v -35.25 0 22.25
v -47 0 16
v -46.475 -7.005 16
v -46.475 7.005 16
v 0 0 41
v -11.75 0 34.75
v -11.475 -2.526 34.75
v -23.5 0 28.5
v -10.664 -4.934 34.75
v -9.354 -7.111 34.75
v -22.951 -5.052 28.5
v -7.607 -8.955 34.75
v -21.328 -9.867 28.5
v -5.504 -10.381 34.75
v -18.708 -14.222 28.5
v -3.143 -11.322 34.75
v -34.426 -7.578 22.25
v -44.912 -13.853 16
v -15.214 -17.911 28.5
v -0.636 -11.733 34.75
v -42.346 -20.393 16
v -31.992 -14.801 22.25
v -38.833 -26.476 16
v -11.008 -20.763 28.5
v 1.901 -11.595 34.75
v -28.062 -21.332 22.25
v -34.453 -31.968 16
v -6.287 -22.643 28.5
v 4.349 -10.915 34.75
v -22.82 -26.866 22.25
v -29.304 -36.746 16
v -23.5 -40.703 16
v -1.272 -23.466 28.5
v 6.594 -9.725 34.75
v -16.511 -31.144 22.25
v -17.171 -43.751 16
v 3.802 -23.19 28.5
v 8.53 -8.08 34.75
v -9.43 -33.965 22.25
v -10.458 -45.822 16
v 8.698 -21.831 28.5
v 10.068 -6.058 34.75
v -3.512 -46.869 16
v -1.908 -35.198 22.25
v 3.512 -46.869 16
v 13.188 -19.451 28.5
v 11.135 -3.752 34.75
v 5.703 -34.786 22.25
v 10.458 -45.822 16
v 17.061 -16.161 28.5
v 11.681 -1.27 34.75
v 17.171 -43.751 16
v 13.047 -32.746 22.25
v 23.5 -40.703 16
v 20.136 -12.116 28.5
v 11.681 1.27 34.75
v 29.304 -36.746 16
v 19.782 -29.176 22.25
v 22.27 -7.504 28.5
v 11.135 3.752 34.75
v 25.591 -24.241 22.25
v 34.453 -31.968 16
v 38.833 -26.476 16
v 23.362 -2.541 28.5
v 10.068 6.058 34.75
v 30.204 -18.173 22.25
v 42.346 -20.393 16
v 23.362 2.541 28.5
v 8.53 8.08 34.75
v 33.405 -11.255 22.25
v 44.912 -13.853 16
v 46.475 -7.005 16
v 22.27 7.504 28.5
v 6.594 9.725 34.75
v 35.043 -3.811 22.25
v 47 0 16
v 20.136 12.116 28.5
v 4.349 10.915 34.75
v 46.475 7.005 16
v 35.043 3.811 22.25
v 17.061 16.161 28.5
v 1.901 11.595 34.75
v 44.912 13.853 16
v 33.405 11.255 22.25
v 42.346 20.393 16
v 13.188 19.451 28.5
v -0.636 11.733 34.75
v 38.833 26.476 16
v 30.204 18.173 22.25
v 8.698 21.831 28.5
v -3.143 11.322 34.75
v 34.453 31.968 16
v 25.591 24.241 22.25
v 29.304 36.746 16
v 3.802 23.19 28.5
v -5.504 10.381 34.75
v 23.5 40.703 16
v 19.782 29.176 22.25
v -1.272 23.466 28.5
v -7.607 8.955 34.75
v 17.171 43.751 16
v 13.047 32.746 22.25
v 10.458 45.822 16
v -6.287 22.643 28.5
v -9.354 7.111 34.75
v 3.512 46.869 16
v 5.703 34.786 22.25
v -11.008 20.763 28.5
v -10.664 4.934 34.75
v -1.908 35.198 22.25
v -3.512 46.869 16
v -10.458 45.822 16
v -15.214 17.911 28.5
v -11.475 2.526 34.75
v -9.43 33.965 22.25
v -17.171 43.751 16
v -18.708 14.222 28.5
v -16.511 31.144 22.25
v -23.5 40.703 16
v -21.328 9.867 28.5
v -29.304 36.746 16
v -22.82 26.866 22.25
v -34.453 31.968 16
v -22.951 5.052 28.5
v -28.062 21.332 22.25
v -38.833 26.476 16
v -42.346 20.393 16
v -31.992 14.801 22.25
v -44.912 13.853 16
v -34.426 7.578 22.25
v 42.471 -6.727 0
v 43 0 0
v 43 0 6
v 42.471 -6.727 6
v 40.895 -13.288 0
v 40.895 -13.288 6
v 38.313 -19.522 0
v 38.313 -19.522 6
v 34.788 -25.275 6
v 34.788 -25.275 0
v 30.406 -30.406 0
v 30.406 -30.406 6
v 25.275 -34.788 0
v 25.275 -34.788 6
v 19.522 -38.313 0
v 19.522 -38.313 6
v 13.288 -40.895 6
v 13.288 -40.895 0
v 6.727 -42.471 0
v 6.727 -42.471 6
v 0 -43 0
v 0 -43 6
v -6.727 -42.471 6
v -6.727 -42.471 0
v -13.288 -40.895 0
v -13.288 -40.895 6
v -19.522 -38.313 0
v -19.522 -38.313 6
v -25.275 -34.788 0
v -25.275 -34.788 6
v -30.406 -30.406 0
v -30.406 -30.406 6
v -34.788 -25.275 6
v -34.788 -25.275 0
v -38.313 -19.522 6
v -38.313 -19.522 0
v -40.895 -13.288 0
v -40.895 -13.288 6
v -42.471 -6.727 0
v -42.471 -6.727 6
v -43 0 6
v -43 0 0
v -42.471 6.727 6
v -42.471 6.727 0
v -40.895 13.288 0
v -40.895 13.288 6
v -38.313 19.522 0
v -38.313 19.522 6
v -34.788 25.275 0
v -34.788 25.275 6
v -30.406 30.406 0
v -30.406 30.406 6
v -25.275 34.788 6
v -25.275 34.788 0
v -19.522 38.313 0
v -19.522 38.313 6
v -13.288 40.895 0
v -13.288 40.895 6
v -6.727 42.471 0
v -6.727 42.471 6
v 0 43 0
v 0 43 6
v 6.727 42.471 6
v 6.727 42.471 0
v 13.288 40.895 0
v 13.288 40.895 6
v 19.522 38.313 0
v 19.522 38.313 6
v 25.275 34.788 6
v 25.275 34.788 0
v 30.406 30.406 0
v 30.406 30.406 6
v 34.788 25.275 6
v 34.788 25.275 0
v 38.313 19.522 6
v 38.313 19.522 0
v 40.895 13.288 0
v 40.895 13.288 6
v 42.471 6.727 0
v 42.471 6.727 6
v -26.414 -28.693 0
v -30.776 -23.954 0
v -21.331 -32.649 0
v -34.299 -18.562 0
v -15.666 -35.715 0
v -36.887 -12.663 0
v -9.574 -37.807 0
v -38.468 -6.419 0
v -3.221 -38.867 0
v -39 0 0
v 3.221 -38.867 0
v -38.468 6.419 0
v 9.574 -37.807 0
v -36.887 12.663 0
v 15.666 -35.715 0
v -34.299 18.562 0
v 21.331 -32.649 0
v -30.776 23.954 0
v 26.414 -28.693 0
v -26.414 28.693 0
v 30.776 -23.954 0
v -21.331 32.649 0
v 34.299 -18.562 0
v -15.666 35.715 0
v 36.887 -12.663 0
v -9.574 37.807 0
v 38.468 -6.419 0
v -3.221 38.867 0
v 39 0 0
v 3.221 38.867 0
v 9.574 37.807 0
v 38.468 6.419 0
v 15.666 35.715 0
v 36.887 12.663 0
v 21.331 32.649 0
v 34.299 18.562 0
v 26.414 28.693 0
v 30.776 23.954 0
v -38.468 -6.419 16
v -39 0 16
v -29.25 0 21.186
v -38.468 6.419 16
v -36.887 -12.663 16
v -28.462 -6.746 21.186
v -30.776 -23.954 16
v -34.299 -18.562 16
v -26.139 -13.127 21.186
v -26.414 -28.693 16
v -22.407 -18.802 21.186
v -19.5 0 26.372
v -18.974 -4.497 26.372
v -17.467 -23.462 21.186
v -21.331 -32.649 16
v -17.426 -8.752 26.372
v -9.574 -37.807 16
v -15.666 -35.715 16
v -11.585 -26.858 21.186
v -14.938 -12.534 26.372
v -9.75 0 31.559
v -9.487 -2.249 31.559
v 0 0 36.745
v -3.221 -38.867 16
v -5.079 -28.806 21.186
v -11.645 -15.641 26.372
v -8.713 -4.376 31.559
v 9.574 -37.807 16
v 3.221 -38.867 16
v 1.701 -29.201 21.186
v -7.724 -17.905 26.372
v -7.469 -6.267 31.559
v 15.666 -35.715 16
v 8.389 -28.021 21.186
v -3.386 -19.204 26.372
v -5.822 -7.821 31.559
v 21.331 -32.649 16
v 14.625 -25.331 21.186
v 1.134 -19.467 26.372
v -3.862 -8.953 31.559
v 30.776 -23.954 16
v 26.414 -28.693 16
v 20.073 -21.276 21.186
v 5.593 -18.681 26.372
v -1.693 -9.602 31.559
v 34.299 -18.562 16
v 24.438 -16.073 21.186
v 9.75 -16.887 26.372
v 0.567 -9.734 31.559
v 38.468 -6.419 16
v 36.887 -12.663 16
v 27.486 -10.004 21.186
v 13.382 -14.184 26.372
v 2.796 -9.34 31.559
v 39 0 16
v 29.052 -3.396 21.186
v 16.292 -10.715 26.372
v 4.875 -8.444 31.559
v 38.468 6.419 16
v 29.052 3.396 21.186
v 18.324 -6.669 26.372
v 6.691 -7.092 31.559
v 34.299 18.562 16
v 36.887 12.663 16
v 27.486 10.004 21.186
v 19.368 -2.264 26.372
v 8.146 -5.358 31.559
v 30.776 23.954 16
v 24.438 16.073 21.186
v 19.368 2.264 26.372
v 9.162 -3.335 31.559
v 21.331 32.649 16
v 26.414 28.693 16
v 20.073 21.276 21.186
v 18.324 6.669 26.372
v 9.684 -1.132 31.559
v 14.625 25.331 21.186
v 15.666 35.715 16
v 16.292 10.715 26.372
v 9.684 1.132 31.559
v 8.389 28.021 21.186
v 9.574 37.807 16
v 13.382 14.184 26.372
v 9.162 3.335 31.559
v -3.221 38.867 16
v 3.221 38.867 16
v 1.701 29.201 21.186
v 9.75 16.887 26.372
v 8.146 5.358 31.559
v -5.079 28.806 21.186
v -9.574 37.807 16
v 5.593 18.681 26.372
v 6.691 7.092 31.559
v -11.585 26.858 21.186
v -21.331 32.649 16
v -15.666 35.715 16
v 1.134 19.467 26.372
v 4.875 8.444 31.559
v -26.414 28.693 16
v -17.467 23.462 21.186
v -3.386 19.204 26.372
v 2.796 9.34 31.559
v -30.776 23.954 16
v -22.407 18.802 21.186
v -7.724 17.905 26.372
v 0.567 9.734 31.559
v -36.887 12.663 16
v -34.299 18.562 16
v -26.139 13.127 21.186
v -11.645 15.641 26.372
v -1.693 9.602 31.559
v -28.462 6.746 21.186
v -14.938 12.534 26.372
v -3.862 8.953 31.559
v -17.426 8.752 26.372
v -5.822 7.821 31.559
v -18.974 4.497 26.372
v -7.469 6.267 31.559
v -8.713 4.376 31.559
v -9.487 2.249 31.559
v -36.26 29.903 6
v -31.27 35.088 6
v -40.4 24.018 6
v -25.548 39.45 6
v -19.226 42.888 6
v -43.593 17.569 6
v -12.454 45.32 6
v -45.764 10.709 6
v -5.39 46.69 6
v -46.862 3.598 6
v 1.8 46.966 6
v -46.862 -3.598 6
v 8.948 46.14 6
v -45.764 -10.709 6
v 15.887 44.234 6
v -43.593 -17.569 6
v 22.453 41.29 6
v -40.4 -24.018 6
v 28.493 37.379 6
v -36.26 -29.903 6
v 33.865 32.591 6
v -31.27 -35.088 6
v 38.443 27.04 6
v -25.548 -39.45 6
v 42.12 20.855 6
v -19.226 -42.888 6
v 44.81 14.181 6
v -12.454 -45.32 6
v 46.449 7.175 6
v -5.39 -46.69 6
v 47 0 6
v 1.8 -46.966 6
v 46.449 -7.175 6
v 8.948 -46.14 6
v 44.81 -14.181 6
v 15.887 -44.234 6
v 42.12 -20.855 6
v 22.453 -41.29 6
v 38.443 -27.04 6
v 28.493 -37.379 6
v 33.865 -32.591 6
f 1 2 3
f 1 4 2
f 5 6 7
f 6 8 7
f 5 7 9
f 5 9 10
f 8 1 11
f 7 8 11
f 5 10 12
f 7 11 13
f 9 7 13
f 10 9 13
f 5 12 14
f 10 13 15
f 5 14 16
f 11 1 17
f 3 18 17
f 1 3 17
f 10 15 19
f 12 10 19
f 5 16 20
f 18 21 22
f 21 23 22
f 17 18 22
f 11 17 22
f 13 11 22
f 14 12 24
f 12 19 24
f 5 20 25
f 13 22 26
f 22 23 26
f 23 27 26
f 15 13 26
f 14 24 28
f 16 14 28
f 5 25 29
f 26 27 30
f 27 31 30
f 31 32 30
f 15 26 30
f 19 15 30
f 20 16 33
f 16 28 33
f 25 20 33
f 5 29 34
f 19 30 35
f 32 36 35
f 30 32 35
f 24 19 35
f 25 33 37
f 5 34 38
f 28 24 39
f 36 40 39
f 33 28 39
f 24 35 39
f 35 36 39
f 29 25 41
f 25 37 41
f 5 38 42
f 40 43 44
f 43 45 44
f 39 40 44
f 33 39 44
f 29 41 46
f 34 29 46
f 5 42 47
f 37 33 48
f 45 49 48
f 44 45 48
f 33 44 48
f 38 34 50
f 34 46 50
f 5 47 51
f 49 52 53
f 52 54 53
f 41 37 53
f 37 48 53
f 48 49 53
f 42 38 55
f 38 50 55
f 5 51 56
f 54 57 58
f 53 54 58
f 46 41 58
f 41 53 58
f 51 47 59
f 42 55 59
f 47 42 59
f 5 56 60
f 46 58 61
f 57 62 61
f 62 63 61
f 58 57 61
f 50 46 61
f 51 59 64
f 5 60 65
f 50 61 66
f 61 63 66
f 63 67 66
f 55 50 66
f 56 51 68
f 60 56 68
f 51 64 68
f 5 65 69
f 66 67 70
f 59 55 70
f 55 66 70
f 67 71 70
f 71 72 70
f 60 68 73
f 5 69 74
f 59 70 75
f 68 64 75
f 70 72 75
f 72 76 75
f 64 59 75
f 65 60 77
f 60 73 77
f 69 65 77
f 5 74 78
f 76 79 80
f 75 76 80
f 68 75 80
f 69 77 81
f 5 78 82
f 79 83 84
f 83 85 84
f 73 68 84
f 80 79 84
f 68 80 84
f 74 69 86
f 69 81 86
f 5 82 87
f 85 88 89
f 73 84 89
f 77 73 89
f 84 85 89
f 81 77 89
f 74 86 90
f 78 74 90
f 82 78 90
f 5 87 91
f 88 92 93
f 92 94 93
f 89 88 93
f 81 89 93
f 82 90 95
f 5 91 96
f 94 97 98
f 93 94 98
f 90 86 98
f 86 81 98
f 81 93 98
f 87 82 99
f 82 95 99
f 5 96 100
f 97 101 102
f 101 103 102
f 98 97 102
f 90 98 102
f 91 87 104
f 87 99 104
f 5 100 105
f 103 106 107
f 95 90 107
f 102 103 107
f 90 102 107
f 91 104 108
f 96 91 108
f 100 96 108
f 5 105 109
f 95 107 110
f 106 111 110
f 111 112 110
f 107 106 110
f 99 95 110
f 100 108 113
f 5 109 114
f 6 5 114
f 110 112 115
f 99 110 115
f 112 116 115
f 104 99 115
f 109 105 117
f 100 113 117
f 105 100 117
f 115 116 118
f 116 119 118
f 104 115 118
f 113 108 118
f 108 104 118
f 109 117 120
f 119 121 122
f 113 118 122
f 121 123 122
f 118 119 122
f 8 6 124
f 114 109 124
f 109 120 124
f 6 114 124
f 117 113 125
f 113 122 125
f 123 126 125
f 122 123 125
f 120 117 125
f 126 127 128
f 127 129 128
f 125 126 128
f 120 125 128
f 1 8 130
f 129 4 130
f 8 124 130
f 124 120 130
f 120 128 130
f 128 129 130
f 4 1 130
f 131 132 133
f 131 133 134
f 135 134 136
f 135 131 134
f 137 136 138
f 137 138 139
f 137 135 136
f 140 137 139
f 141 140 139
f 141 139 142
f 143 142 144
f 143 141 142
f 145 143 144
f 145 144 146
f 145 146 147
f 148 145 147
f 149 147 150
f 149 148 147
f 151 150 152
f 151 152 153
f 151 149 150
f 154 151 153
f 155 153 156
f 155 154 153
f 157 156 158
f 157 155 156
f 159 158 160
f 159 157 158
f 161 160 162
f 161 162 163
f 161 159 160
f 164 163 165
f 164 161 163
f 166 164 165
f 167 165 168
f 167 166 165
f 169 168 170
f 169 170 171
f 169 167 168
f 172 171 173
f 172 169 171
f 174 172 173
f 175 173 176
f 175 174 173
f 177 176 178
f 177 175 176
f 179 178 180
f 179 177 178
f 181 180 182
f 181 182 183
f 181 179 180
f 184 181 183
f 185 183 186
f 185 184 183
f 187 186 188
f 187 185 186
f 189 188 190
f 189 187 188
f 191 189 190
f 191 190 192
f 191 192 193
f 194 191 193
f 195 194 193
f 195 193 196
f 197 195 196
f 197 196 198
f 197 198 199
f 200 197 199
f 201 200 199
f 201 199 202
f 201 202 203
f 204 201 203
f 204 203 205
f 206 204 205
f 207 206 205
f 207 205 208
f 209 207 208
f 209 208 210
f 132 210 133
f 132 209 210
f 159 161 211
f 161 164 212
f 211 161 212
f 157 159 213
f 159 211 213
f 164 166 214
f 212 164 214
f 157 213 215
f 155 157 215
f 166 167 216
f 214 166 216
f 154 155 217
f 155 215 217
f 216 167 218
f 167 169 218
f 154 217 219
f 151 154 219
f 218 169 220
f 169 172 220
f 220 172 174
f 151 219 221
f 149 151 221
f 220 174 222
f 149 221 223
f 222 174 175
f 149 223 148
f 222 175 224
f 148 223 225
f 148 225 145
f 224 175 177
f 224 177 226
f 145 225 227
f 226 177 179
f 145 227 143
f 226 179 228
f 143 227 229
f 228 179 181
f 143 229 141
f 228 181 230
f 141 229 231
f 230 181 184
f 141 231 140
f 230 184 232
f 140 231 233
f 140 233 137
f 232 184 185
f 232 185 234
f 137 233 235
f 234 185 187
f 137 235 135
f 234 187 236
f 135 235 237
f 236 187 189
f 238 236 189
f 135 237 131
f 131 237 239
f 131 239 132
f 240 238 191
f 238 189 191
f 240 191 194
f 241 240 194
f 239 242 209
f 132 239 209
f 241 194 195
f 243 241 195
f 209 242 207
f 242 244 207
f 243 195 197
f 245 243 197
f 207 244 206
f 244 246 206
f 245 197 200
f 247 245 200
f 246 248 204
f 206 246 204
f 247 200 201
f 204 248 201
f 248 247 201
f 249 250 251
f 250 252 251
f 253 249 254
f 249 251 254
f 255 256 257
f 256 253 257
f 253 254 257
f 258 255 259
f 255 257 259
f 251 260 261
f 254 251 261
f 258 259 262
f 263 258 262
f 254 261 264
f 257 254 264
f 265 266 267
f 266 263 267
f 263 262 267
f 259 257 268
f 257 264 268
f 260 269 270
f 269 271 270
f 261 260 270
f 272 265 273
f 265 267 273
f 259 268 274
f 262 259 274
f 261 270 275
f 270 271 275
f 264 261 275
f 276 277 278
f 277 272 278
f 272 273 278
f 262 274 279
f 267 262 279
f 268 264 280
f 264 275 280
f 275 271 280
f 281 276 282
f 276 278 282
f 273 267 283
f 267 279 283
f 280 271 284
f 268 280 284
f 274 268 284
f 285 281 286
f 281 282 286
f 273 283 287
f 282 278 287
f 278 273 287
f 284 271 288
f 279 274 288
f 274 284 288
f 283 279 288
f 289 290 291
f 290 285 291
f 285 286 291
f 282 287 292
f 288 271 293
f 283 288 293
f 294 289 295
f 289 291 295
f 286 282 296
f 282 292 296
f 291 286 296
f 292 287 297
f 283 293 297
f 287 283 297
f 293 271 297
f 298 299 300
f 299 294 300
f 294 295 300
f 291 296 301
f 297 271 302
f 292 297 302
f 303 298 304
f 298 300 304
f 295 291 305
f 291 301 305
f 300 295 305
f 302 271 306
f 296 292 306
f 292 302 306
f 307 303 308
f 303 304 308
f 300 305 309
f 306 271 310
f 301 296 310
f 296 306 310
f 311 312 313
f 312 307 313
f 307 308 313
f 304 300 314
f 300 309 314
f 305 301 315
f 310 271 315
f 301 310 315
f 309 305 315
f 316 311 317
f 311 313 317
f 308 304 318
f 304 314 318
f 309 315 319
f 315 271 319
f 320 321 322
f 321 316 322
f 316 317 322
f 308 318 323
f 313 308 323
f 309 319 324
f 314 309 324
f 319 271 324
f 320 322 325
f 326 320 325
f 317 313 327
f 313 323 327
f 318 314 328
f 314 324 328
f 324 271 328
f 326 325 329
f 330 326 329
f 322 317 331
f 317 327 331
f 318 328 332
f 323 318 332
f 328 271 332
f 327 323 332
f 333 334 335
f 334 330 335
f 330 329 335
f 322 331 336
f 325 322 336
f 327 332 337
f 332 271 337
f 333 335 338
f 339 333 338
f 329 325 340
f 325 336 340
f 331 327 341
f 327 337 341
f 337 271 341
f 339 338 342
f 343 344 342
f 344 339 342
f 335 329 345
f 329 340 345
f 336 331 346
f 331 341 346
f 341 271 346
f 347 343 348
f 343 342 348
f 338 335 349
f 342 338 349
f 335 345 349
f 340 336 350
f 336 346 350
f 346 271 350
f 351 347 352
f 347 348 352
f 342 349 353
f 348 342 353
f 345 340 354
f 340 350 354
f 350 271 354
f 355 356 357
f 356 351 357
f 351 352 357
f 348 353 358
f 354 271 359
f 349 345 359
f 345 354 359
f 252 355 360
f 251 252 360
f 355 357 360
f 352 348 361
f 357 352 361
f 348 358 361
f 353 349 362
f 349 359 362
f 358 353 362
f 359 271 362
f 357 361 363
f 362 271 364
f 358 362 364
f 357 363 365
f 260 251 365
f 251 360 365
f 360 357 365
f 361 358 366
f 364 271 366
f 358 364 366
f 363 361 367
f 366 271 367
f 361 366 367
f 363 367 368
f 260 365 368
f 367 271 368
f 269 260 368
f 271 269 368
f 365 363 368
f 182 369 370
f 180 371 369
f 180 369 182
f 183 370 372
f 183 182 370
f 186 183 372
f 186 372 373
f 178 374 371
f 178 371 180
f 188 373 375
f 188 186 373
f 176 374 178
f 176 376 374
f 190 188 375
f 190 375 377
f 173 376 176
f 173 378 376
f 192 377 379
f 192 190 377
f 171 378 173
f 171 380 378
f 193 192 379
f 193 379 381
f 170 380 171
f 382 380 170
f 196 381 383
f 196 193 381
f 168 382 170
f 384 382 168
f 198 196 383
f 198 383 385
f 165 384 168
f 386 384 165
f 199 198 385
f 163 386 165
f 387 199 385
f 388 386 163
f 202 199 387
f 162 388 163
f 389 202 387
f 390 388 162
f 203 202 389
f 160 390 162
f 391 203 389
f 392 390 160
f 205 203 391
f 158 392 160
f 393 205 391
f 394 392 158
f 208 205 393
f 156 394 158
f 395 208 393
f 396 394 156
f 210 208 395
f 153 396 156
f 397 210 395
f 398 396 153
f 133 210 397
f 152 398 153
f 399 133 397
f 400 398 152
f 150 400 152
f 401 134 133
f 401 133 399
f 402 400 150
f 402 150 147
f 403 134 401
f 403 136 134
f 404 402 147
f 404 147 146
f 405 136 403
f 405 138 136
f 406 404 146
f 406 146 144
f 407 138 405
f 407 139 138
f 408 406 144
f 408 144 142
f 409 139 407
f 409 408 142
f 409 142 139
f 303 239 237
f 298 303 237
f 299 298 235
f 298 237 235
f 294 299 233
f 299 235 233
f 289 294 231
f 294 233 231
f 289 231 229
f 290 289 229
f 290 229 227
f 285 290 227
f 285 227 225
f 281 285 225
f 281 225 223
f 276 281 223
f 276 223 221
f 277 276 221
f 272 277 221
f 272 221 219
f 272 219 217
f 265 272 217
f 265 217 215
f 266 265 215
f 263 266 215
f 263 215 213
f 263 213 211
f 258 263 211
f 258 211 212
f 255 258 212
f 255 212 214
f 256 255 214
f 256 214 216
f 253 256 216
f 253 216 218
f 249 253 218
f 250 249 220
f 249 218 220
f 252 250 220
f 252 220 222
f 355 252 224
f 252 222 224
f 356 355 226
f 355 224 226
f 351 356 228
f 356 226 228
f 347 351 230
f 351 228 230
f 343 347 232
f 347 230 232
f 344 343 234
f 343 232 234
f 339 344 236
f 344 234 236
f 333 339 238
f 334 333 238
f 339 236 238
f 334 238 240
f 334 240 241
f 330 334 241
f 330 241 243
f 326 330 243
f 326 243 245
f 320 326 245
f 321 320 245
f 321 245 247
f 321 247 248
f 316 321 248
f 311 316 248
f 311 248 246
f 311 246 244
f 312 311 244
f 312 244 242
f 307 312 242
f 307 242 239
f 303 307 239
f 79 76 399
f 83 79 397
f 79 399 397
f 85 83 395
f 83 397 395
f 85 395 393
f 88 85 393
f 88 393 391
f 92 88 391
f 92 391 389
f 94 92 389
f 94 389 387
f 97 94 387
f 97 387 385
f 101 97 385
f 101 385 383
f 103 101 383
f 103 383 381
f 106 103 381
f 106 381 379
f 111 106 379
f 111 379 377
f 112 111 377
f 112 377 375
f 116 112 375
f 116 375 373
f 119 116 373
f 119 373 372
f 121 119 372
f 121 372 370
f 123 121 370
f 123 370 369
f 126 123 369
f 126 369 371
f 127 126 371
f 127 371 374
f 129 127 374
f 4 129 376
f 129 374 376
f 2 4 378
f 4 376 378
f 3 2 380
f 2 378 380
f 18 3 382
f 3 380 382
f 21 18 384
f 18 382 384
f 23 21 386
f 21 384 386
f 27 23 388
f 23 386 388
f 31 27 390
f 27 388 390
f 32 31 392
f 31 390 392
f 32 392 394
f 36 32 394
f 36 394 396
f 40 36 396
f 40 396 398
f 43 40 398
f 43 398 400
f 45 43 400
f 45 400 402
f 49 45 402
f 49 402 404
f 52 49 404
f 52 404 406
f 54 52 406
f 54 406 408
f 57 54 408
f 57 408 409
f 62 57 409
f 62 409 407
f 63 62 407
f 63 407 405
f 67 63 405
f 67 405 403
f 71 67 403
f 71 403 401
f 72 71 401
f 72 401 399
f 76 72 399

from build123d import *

# Parameters (mm, degrees)
F0_R     = 47
F1_DEPTH = 16
F2_R     = 39
F3_DEPTH = 16
F4_R     = 47
F4_R_2   = 43
F5_DEPTH = 6


with BuildPart() as f1:
    # F0 (on Top) → F1 (new body)
    with BuildSketch(Plane.XY):
        Circle(F0_R)
    extrude(amount=F1_DEPTH)

    # F2 (on face) → F3 (cut)
    with BuildSketch(Plane(origin=(0, 0, 0), x_dir=(1, 0, 0), z_dir=(0, 0, -1))):
        Circle(F2_R)
    extrude(amount=-F3_DEPTH, mode=Mode.SUBTRACT)

    # F4 (on face) → F5 (cut)
    with BuildSketch(Plane(origin=(0, 0, 0), x_dir=(1, 0, 0), z_dir=(0, 0, -1))):
        Circle(F4_R)
        Circle(F4_R_2, mode=Mode.SUBTRACT)
    extrude(amount=-F5_DEPTH, mode=Mode.SUBTRACT)

    # F7 (on Front) → F8 (revolve)
    with BuildSketch(Plane.XZ):
        Polygon((-39, 16), (0, 36.744681), (0, 41), (-47, 16), align=None)
    revolve(axis=Axis((0, 0, 12.147951), (0, 0, 1)))


solid = f1.part
